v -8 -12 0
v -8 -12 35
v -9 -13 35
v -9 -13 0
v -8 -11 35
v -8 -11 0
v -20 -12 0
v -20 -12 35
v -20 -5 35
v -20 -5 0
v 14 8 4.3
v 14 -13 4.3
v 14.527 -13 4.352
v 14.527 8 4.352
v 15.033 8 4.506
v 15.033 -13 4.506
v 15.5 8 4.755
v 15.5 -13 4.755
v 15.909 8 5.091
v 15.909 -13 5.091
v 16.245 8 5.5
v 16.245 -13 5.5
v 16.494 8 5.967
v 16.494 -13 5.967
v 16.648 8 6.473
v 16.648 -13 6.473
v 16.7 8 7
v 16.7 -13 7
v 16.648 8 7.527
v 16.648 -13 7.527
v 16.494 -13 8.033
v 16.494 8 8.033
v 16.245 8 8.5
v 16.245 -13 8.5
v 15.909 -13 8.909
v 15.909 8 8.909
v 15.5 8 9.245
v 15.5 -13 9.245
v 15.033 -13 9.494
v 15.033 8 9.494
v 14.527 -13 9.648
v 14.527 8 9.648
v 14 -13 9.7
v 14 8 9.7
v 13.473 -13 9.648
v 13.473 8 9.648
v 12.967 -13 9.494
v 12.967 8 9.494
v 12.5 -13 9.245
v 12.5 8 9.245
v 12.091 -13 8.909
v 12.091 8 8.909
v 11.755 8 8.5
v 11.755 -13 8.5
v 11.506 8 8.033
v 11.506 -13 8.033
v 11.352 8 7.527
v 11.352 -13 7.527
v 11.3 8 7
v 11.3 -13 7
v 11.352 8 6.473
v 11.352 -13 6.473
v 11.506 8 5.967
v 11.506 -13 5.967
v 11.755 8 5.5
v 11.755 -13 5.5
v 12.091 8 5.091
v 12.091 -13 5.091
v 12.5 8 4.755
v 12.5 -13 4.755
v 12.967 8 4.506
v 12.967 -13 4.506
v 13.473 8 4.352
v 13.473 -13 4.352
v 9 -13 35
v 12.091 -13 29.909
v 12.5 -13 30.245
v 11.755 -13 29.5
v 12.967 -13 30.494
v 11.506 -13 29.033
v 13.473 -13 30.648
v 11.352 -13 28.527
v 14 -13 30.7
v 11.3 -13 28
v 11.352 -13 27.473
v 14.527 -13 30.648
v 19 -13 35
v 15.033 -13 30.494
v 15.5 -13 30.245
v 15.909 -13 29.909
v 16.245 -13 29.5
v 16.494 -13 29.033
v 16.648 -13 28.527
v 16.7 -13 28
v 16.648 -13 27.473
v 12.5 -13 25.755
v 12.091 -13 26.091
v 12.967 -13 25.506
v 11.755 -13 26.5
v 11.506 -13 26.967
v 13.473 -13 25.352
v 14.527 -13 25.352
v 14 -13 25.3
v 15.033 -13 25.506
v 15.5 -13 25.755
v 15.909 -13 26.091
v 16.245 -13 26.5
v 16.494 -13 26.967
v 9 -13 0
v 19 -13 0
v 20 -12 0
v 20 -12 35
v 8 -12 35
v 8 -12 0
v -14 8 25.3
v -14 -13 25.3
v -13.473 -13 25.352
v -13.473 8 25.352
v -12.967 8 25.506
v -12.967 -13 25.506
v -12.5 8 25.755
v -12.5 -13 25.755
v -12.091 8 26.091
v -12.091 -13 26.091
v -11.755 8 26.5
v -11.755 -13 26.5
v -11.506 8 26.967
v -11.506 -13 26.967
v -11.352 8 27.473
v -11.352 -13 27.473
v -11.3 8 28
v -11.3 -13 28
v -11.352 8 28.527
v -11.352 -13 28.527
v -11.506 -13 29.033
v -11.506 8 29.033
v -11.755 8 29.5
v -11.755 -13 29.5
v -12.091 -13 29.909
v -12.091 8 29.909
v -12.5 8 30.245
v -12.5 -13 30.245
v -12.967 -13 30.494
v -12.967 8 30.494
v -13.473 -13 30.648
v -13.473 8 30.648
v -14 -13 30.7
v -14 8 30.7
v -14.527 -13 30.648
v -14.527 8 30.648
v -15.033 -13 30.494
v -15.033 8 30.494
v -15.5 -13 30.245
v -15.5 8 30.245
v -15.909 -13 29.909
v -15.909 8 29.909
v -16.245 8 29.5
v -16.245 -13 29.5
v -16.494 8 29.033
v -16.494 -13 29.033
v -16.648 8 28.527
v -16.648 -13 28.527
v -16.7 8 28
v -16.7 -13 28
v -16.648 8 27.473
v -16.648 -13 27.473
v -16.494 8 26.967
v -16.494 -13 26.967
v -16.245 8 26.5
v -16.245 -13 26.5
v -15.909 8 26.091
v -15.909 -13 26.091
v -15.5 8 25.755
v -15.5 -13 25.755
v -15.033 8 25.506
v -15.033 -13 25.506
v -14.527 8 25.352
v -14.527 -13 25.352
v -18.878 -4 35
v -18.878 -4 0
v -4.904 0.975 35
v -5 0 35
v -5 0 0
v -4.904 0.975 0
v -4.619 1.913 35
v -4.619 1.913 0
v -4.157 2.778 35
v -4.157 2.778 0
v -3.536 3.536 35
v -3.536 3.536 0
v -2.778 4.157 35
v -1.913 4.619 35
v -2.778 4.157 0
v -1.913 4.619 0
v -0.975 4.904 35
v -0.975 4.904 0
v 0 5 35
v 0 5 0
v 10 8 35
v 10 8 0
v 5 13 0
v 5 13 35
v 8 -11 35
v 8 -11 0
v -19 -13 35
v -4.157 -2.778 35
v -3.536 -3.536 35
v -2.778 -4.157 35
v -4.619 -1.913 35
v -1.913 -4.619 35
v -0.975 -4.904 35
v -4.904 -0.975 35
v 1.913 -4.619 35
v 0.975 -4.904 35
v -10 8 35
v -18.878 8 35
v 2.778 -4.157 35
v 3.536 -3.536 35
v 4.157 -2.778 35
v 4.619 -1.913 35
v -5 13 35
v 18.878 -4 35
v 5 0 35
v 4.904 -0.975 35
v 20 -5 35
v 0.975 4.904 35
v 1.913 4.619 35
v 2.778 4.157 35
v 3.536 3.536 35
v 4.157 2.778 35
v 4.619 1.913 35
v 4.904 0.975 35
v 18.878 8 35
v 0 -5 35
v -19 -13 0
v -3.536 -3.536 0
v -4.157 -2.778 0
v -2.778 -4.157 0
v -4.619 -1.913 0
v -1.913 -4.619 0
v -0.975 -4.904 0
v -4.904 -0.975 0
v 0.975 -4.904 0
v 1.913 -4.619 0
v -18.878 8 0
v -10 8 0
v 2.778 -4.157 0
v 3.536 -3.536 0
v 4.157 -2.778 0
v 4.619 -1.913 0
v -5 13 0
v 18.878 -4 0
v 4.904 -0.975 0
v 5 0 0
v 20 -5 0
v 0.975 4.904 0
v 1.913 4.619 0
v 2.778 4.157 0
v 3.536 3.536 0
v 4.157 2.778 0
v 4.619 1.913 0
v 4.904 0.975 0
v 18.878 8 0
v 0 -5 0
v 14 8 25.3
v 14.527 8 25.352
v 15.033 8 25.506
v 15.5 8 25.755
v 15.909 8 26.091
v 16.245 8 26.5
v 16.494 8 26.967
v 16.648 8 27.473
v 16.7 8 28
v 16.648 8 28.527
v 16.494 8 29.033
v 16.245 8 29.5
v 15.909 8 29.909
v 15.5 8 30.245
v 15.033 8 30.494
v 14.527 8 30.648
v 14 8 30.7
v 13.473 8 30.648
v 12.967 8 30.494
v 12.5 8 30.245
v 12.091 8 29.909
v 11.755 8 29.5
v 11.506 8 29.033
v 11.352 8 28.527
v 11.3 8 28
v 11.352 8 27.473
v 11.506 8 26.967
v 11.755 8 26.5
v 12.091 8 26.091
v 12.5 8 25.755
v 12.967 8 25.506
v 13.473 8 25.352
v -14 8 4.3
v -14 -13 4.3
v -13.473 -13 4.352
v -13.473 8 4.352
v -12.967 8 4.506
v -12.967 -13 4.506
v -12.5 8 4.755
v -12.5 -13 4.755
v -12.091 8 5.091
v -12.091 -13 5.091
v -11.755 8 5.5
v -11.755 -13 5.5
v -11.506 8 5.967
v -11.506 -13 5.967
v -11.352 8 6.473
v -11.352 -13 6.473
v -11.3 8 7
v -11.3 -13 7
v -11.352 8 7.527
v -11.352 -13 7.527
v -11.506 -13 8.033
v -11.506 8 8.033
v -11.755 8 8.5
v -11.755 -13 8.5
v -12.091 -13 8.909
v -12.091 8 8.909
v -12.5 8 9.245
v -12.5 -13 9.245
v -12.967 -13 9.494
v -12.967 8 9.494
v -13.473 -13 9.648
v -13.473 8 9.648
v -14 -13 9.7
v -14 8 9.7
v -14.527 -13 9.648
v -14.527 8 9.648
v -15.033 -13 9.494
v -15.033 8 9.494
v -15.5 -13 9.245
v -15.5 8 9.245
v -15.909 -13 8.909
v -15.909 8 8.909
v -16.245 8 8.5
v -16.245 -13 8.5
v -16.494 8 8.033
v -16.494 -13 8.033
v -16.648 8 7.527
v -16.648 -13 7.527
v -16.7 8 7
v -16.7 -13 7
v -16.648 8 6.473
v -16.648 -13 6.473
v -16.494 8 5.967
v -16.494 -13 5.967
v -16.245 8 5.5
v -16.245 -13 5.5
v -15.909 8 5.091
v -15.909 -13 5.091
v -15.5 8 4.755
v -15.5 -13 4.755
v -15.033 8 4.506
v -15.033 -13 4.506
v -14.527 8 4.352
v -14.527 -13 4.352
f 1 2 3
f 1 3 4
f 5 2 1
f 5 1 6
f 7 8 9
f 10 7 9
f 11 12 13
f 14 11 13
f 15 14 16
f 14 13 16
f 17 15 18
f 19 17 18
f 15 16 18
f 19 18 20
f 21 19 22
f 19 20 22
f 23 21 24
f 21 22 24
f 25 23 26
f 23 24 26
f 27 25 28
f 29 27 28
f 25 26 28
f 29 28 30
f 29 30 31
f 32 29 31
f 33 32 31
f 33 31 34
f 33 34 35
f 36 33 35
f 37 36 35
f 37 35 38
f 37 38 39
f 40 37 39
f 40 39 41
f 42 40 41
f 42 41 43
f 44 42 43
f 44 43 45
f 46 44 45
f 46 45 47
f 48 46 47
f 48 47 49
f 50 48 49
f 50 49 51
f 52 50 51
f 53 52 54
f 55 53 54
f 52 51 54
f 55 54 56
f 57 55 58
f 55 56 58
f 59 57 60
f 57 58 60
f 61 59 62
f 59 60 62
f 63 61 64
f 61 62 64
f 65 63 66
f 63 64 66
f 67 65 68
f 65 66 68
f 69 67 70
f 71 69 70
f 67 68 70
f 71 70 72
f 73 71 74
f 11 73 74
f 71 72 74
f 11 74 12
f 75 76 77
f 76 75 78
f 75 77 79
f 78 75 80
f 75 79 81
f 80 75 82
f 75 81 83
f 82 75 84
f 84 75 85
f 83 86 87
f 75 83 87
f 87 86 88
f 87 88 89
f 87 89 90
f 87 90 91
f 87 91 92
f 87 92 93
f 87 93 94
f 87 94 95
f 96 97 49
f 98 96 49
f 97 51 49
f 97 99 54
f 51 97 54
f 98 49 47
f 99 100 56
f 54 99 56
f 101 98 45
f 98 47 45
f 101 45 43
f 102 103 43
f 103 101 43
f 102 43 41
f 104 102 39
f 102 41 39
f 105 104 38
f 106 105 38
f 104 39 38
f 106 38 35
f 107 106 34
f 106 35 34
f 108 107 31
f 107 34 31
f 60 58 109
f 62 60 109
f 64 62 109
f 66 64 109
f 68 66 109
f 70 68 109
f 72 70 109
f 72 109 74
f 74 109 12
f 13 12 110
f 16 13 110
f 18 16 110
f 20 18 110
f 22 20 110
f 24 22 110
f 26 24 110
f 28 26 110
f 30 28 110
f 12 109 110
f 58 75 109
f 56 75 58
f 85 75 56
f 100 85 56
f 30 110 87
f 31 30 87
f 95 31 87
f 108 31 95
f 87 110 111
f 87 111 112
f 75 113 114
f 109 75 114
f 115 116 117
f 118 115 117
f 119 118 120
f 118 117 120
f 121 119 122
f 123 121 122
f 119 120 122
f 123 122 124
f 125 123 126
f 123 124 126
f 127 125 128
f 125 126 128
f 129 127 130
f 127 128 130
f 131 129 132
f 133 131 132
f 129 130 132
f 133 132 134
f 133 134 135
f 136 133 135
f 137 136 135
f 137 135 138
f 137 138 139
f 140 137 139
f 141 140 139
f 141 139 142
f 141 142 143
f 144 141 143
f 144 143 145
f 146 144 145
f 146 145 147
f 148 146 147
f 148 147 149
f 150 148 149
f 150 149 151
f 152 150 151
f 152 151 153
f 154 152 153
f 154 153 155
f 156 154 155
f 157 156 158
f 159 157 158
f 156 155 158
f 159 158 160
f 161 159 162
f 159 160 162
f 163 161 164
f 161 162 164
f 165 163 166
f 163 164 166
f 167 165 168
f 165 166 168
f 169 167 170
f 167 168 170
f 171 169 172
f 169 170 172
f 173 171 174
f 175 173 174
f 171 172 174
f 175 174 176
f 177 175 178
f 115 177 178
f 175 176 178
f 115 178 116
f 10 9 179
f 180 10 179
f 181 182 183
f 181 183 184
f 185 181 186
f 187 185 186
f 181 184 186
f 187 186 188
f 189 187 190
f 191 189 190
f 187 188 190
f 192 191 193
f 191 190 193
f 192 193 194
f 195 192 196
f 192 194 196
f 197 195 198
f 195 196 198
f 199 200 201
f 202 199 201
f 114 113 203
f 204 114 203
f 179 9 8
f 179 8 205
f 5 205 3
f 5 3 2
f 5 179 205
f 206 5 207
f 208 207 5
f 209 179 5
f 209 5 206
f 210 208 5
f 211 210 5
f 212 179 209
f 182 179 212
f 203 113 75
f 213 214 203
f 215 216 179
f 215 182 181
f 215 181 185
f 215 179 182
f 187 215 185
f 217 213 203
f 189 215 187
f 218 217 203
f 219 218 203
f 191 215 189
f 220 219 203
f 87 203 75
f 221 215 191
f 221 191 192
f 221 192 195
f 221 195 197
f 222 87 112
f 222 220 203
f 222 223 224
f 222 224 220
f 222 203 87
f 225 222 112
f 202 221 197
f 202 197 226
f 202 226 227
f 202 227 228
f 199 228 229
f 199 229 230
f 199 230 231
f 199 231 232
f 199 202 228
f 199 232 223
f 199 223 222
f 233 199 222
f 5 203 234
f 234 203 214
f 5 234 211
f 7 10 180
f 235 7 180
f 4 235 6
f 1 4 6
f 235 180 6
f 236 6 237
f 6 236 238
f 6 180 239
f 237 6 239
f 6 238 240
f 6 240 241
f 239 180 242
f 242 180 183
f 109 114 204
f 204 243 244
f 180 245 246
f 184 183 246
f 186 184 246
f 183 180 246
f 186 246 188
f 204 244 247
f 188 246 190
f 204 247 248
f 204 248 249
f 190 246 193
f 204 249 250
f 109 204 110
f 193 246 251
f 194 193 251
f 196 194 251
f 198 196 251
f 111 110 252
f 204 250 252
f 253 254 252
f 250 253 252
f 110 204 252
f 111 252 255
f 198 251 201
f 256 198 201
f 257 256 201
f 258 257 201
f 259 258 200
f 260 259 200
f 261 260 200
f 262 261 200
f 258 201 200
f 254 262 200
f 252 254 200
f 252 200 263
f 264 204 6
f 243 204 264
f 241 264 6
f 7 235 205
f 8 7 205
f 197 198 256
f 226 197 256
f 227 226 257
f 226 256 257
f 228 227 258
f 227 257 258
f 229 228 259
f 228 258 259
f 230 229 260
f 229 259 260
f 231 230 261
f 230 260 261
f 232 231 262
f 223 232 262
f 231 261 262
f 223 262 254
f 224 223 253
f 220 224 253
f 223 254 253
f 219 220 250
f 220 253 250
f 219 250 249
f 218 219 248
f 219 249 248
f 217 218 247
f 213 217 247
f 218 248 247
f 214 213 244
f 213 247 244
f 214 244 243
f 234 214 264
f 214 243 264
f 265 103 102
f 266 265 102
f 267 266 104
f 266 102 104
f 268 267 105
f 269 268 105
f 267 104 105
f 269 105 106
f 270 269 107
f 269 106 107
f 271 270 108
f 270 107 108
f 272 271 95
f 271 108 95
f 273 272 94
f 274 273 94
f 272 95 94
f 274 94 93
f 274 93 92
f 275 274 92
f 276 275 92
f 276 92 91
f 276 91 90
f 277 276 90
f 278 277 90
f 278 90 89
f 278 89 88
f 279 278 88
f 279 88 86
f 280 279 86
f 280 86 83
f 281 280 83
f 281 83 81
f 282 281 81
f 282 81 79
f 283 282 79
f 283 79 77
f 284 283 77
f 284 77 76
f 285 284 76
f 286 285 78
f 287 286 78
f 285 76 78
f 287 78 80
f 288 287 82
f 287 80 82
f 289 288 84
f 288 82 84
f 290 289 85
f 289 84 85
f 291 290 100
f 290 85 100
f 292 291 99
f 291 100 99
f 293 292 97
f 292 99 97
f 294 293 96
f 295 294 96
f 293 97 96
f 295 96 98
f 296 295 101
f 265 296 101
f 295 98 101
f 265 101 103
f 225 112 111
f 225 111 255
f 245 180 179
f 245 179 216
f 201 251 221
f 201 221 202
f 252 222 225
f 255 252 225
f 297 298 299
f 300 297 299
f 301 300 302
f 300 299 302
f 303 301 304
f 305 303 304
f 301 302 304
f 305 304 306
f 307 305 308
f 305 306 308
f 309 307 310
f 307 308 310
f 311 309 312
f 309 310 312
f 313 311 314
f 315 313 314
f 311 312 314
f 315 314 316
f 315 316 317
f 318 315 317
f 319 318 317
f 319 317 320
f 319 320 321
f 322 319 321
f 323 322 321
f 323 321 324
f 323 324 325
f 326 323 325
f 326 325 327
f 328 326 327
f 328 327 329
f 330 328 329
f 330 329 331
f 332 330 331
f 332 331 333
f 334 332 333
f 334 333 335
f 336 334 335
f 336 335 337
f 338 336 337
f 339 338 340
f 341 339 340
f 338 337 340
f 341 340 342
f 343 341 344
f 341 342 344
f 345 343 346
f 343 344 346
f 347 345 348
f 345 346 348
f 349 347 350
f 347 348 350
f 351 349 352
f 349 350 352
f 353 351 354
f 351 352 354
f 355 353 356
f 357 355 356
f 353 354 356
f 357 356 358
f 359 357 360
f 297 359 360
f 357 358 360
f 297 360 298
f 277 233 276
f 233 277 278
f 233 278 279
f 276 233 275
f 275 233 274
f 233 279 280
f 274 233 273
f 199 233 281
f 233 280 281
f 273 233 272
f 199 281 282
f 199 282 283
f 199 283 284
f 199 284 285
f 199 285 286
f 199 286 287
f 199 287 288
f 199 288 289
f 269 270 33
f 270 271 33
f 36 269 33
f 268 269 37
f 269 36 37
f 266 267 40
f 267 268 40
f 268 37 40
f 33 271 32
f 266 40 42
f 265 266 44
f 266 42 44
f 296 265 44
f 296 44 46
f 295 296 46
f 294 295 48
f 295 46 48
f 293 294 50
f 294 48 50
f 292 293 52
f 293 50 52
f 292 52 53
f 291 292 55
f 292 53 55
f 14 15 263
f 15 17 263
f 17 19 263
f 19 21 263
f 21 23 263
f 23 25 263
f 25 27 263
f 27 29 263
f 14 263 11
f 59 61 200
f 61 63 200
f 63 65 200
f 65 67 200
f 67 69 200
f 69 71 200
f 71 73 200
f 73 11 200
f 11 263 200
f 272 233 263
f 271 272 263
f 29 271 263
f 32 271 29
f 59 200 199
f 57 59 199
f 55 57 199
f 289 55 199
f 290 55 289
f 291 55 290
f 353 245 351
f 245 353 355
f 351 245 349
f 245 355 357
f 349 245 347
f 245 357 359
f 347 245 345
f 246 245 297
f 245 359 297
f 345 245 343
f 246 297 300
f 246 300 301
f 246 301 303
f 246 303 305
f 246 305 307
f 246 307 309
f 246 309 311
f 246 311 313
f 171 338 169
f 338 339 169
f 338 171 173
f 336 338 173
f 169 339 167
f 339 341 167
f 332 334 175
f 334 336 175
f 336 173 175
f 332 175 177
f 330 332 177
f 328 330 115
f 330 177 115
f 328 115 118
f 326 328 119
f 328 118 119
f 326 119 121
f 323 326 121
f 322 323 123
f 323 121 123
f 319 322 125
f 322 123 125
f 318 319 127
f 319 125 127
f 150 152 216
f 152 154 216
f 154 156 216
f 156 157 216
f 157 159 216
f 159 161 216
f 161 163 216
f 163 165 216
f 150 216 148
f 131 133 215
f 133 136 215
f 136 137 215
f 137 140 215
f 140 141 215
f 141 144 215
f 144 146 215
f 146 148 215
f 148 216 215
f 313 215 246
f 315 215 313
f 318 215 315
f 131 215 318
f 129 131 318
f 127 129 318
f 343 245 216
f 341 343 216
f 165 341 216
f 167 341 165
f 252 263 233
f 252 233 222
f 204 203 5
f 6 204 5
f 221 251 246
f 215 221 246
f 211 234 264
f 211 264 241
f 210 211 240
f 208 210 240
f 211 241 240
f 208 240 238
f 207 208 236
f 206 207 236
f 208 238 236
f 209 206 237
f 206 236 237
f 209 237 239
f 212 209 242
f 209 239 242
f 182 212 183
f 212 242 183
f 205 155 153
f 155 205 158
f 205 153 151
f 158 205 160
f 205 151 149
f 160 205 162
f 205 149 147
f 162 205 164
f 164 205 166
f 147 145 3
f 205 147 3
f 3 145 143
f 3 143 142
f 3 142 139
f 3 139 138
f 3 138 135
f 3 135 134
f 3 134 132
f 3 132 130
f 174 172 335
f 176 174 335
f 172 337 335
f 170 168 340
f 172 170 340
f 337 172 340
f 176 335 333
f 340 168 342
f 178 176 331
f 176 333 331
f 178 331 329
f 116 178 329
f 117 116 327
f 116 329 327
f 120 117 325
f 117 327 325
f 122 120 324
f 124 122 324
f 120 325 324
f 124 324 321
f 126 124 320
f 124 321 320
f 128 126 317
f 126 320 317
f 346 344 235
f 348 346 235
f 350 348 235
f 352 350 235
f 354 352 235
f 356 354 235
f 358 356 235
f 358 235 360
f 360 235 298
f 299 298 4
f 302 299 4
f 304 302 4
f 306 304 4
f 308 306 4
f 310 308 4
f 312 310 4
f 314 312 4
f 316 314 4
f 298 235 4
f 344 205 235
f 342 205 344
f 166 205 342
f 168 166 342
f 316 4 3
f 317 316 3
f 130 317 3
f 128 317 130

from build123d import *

# Parameters (mm, degrees)
SKETCH_1_W          = 40
SKETCH_1_H          = 26
EXTRUDE_1_DEPTH     = 35
CUT_EXTRUDE_1_DEPTH = 43.355637169
SKETCH_4_R          = 2.5
CUT_EXTRUDE_2_DEPTH = 46.453272709
CUT_EXTRUDE_3_DEPTH = 43.355637169
SKETCH_7_W          = 8
SKETCH_7_H          = 2
CUT_EXTRUDE_4_DEPTH = 43.355637169
CHAMFER_1_SIZE      = 1
EXTRUDE_START       = -21
SKETCH_9_R          = 2.5
EXTRUDE_2_DEPTH     = 21
SKETCH_10_R         = 2.7
CUT_EXTRUDE_5_DEPTH = 48.968739821
SKETCH_13_R         = 2.5
EXTRUDE_3_DEPTH     = 21
SKETCH_14_R         = 2.7
CUT_EXTRUDE_6_DEPTH = 48.968739821
SKETCH_15_R         = 2.7
CUT_EXTRUDE_7_DEPTH = 48.968739821


with BuildPart() as part:
    # Эскиз1 → Бобышка-Вытянуть1 (new body)
    with BuildSketch(Plane.XY):
        Rectangle(SKETCH_1_W, SKETCH_1_H)
    extrude(amount=EXTRUDE_1_DEPTH)

    # Эскиз2 → Вырез-Вытянуть1 (cut, through all)
    with BuildSketch(Plane(origin=(0, 0, 0), x_dir=(-1, 0, 0), z_dir=(0, 0, -1))):
        Polygon((-10, 8), (-5, 13), (-20, 13), (-20, 8), align=None)
        Polygon((20, 13), (5, 13), (10, 8), (20, 8), align=None)
        with BuildLine():
            ThreePointArc((5, 0), (3.535533906, 3.535533906), (0, 5))
            Line((0, 5), (0, 0))
            Line((0, 0), (0, -5))
            ThreePointArc((0, -5), (3.535533906, -3.535533906), (5, 0))
        make_face()
        with BuildLine():
            Line((0, 0), (0, 5))
            ThreePointArc((0, 5), (-5, 0), (0, -5))
            Line((0, -5), (0, 0))
        make_face()
    extrude(amount=-CUT_EXTRUDE_1_DEPTH, mode=Mode.SUBTRACT)

    # Эскиз4 → Вырез-Вытянуть2 (cut, through all)
    with BuildSketch(Plane(origin=(0, 8, 0), x_dir=(1, 0, 0), z_dir=(0, 1, 0))):
        with BuildLine():
            ThreePointArc((-12.5, -7), (-15, -4.5), (-17.5, -7))
            Line((-17.5, -7), (-12.5, -7))
        make_face()
        with BuildLine():
            Line((-12.5, -7), (-17.5, -7))
            ThreePointArc((-17.5, -7), (-15, -9.5), (-12.5, -7))
        make_face()
        with BuildLine():
            ThreePointArc((-12.5, -28), (-15, -25.5), (-17.5, -28))
            Line((-17.5, -28), (-12.5, -28))
        make_face()
        with BuildLine():
            Line((-12.5, -28), (-17.5, -28))
            ThreePointArc((-17.5, -28), (-15, -30.5), (-12.5, -28))
        make_face()
        with Locations(Location((15, -28, 0), (0, 0, 180))):
            Circle(SKETCH_4_R)
        with Locations(Location((15, -7, 0), (0, 0, 180))):
            Circle(SKETCH_4_R)
    extrude(amount=-CUT_EXTRUDE_2_DEPTH, mode=Mode.SUBTRACT)

    # Эскиз6 → Вырез-Вытянуть3 (cut, through all)
    with BuildSketch(Plane.XY.offset(35)):
        Polygon((-18.878222765, 8), (-20, 8), (-20, -5), (-18.878222765, -4), align=None)
        Polygon((18.878222765, 8), (18.878222765, -4), (20, -5), (20, 8), align=None)
    extrude(amount=-CUT_EXTRUDE_3_DEPTH, mode=Mode.SUBTRACT)

    # Эскиз7 → Вырез-Вытянуть4 (cut, through all)
    with BuildSketch(Plane.XY.offset(35)):
        with Locations((-4, -12)):
            Rectangle(SKETCH_7_W, SKETCH_7_H)
        with Locations((4, -12)):
            Rectangle(SKETCH_7_W, SKETCH_7_H)
    extrude(amount=-CUT_EXTRUDE_4_DEPTH, mode=Mode.SUBTRACT)

    # Фаска1
    chamfer_1_edges = [part.edges().sort_by_distance(p)[0] for p in [
        (20, -13, 17.5),
        (-20, -13, 17.5),
        (8, -13, 17.5),
        (-8, -13, 17.5),
    ]]
    chamfer(chamfer_1_edges, length=CHAMFER_1_SIZE)

    # Эскиз9 → Бобышка-Вытянуть2 (add)
    with BuildSketch(Plane.XZ.offset(13).offset(EXTRUDE_START)):
        with Locations((-15, 28)):
            Circle(SKETCH_9_R)
    extrude(amount=EXTRUDE_2_DEPTH)

    # Эскиз10 → Вырез-Вытянуть5 (cut, through all)
    with BuildSketch(Plane.XZ.offset(13)):
        with Locations(Location((-14, 28, 0), (0, 0, 270))):
            Circle(SKETCH_10_R)
    extrude(amount=-CUT_EXTRUDE_5_DEPTH, mode=Mode.SUBTRACT)

    # Эскиз13 → Бобышка-Вытянуть3 (add)
    with BuildSketch(Plane.XZ.offset(13).offset(EXTRUDE_START)):
        with Locations((-15, 7)):
            Circle(SKETCH_13_R)
        with Locations((15, 7)):
            Circle(SKETCH_13_R)
        with Locations((15, 28)):
            Circle(SKETCH_13_R)
    extrude(amount=EXTRUDE_3_DEPTH)

    # Эскиз14 → Вырез-Вытянуть6 (cut, through all)
    with BuildSketch(Plane.XZ.offset(13)):
        with Locations(Location((14, 28, 0), (0, 0, 270))):
            Circle(SKETCH_14_R)
    extrude(amount=-CUT_EXTRUDE_6_DEPTH, mode=Mode.SUBTRACT)

    # Эскиз15 → Вырез-Вытянуть7 (cut, through all)
    with BuildSketch(Plane.XZ.offset(13)):
        with Locations(Location((-14, 7, 0), (0, 0, 270))):
            Circle(SKETCH_15_R)
        with Locations(Location((14, 7, 0), (0, 0, 270))):
            Circle(SKETCH_15_R)
    extrude(amount=-CUT_EXTRUDE_7_DEPTH, mode=Mode.SUBTRACT)


solid = part.part
